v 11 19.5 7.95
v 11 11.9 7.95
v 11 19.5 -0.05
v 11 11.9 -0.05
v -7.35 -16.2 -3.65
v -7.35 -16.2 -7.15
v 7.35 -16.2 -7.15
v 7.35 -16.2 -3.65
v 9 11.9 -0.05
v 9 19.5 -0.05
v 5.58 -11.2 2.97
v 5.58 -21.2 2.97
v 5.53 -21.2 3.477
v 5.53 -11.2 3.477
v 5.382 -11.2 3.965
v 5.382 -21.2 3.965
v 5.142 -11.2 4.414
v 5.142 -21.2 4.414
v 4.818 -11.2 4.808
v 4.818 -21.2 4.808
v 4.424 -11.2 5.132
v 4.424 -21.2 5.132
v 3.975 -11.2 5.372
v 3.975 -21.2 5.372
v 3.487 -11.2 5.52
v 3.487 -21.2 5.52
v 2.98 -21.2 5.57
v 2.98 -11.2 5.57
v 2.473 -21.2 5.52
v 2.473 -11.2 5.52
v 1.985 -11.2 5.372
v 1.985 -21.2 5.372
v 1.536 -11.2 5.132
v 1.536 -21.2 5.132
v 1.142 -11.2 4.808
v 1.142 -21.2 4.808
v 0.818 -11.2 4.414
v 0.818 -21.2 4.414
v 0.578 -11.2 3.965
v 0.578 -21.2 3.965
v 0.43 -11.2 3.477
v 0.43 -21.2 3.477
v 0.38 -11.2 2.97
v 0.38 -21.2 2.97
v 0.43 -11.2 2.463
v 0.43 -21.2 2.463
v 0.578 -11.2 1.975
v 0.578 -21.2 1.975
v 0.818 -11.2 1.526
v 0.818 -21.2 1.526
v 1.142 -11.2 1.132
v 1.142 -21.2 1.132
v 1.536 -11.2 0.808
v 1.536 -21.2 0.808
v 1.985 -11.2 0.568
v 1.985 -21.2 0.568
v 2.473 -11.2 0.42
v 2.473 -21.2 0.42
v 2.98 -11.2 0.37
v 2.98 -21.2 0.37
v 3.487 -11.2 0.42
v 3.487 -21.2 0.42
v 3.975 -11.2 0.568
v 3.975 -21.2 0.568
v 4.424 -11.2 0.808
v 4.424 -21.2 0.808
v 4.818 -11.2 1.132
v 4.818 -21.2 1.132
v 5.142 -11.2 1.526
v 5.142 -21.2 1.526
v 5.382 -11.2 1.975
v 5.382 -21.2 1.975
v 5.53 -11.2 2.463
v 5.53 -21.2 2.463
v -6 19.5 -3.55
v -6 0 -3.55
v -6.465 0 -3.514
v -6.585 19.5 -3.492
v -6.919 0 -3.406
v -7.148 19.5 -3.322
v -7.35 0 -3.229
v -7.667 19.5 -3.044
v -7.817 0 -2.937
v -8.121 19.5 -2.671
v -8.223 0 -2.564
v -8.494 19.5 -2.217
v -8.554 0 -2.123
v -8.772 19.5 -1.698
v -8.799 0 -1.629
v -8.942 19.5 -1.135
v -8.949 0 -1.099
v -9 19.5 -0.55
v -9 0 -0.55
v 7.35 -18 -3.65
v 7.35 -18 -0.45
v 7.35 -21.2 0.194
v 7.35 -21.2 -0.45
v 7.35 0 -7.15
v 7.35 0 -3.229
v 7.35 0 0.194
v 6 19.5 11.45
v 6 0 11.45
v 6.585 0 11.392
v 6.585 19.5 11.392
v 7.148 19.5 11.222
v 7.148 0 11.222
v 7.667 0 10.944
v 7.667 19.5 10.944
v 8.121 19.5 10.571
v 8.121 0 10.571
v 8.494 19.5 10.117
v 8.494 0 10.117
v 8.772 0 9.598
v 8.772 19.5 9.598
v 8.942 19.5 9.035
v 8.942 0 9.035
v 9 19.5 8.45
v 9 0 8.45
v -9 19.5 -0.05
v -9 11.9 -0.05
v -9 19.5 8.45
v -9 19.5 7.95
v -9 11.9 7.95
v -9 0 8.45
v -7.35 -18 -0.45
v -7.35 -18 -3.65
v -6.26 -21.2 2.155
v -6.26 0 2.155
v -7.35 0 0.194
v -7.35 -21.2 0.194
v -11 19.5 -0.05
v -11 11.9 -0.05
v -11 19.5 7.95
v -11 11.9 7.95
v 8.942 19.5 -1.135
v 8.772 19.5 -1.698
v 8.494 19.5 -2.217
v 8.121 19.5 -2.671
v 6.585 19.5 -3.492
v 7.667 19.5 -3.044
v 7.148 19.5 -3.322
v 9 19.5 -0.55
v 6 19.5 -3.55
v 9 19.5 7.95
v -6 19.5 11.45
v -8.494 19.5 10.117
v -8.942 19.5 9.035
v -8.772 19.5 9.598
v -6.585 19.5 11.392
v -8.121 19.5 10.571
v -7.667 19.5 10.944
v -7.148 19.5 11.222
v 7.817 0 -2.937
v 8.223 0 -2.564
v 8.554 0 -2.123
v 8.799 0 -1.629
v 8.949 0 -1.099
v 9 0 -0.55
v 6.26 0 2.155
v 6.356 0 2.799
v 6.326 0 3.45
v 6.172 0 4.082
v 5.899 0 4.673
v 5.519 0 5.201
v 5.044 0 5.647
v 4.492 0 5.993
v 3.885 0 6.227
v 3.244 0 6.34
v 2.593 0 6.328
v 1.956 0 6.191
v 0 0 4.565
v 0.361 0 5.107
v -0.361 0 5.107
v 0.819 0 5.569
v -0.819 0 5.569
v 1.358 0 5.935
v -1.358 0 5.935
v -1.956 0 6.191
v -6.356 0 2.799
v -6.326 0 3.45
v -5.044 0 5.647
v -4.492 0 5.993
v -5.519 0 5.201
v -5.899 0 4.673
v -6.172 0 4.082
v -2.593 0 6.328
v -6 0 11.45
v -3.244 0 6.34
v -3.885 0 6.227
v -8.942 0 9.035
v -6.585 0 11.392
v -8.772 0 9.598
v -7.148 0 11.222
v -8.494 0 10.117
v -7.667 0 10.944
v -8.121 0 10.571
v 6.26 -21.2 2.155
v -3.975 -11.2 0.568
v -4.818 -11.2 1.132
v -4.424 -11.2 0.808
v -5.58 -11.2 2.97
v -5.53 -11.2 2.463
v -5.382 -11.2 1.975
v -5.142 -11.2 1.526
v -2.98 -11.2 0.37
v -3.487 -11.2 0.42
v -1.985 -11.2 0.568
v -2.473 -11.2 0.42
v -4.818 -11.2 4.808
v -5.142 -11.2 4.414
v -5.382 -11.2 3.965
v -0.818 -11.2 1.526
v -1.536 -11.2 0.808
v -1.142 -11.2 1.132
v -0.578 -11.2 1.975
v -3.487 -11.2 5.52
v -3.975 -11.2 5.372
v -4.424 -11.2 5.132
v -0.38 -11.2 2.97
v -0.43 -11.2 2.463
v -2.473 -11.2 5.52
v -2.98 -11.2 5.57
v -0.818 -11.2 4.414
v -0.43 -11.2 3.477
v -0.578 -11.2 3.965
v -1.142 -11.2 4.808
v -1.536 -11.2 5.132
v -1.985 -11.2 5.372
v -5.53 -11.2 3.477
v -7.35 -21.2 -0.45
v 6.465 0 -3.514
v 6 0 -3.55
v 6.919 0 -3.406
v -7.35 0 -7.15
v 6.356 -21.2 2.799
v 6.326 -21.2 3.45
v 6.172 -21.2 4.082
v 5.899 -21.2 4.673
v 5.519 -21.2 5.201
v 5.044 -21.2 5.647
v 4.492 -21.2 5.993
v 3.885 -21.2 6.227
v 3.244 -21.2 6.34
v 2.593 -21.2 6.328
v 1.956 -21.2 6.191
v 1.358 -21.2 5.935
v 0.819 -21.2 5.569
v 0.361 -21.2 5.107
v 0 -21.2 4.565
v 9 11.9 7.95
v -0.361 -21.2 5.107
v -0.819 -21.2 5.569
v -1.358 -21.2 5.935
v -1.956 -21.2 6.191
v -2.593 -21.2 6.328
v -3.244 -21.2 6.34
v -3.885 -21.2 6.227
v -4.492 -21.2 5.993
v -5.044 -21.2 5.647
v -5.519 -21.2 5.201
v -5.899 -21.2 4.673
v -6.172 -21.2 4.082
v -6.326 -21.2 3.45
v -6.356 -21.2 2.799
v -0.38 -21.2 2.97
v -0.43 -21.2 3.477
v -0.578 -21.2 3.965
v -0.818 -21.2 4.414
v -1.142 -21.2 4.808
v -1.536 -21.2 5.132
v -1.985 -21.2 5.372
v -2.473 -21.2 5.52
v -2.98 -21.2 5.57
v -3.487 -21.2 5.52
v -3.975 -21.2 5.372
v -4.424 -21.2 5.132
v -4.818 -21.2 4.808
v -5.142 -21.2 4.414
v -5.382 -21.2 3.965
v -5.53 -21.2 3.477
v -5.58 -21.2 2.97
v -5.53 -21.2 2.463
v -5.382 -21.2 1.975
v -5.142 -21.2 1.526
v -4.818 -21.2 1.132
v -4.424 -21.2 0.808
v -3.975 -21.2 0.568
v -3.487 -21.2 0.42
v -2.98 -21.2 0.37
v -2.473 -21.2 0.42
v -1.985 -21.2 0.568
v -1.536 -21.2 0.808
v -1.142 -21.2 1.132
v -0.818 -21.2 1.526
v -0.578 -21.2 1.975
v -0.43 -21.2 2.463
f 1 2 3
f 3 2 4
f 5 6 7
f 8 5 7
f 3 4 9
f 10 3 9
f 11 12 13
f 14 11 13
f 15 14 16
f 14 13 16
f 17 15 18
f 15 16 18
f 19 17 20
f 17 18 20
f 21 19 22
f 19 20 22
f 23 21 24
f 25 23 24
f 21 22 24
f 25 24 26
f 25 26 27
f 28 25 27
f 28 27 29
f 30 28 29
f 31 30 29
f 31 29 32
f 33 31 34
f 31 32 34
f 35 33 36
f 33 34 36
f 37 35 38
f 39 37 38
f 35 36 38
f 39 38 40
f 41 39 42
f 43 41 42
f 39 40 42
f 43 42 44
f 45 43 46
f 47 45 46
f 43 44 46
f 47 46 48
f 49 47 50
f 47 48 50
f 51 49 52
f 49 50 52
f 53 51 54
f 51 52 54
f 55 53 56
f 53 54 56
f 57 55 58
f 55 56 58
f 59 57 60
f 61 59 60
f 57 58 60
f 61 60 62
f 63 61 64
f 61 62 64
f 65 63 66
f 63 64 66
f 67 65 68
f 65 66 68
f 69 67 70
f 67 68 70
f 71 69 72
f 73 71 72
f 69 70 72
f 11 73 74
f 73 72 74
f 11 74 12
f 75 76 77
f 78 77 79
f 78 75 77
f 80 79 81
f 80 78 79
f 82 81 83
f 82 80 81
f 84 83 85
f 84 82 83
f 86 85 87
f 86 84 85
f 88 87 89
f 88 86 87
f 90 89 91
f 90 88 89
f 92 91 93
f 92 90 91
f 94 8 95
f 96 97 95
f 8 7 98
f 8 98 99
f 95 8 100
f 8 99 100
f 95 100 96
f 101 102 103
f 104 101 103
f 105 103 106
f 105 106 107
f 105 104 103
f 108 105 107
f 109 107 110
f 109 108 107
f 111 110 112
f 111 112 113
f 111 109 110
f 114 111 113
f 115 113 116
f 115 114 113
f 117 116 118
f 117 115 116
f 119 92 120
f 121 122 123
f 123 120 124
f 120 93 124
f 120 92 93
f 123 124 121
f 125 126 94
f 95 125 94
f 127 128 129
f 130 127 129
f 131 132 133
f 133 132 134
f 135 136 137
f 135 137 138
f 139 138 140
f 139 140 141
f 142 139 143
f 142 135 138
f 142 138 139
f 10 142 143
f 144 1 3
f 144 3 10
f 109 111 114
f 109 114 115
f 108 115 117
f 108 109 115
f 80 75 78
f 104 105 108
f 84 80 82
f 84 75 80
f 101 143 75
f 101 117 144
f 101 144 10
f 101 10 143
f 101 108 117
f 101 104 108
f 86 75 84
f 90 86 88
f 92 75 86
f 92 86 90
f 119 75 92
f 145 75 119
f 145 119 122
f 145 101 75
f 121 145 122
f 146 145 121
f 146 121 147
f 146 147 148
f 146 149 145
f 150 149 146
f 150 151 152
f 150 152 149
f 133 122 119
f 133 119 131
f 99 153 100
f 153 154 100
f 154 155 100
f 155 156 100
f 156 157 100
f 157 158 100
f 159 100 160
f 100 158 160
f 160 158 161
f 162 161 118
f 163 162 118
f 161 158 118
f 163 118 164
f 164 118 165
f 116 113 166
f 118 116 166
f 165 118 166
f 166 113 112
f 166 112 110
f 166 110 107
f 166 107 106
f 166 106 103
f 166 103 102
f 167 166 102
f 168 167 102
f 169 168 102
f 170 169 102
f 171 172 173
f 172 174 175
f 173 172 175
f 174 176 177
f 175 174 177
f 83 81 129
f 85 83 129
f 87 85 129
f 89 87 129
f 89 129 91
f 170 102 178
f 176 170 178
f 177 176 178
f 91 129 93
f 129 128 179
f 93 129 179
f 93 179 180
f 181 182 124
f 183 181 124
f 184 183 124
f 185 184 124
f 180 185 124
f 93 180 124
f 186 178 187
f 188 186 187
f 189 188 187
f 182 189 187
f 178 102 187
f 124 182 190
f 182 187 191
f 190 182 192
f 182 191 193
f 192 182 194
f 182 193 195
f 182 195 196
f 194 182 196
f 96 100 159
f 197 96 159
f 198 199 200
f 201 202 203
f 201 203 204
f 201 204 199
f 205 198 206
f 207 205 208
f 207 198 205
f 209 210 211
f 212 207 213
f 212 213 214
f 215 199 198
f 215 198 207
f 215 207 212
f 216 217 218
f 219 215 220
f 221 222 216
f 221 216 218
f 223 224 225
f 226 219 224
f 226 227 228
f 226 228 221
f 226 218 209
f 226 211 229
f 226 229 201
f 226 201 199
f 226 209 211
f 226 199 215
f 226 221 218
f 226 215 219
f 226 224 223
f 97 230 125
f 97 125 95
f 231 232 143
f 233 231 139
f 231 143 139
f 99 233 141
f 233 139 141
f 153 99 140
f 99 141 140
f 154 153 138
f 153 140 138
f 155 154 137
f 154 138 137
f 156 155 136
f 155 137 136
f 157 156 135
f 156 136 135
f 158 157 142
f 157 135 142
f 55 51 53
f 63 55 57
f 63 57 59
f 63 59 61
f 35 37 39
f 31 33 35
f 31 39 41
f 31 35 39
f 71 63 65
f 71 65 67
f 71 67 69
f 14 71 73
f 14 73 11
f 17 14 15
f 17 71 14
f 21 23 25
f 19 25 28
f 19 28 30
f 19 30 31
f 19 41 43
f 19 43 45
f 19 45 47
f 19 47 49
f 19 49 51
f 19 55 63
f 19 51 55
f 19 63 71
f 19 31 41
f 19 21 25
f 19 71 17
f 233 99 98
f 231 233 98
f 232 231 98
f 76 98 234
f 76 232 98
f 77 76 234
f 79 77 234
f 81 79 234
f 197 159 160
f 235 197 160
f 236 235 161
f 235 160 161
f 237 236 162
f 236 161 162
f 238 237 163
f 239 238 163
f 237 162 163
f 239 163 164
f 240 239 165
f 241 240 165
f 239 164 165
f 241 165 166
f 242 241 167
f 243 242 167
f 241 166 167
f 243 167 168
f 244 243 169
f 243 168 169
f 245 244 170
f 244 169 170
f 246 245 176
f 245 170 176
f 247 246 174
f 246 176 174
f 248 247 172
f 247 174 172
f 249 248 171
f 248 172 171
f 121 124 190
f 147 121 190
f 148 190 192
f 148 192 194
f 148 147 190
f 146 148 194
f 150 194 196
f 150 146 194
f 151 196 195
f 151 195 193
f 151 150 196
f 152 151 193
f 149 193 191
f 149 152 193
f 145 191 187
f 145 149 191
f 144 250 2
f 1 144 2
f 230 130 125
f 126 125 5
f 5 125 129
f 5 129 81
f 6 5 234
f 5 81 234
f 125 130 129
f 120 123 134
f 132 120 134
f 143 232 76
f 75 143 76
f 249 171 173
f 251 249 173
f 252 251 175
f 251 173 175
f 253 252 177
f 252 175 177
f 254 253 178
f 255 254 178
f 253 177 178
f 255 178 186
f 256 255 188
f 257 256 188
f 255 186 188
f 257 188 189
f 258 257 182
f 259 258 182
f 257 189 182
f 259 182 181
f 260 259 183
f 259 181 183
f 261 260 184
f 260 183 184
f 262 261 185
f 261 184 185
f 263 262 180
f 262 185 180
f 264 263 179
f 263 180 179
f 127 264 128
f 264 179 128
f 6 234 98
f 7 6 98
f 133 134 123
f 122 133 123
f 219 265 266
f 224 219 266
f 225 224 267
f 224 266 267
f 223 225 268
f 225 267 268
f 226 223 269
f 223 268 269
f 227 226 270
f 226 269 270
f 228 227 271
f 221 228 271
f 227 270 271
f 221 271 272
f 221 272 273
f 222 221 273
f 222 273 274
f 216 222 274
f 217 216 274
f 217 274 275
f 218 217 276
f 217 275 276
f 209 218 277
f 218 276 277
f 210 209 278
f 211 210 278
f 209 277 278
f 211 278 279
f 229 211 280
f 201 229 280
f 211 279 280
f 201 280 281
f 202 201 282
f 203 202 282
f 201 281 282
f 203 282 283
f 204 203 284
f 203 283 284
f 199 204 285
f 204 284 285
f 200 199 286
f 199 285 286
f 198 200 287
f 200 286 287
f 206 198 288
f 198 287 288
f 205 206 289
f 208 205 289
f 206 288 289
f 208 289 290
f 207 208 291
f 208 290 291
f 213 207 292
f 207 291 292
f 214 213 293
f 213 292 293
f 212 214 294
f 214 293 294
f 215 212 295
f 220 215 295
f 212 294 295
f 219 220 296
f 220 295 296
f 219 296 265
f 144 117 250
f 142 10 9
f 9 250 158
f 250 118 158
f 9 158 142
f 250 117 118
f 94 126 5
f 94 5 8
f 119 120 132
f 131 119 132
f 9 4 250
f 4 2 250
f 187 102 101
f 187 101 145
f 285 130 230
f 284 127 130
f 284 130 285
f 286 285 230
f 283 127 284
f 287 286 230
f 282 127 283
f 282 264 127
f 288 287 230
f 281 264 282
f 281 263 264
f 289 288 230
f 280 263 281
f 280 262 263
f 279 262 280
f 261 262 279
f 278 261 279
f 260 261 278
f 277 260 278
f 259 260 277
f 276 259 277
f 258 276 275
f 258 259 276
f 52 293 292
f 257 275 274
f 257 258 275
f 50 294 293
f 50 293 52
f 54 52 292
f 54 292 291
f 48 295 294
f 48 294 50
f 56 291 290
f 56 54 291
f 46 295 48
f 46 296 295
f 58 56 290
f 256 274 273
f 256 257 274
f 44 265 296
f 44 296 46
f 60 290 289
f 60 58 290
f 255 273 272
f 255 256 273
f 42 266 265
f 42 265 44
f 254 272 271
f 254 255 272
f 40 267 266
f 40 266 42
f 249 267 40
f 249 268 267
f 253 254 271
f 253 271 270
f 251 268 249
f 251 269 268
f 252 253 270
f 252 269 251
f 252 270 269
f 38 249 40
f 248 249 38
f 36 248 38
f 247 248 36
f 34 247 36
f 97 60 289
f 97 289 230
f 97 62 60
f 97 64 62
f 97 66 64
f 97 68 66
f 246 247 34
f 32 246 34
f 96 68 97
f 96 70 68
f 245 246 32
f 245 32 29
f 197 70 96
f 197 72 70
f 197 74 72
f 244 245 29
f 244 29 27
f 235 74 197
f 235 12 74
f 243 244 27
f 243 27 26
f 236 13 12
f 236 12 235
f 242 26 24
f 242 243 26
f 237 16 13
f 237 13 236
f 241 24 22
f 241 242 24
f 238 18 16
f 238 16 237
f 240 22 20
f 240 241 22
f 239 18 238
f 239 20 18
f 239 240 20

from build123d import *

# Parameters (mm, degrees)
F1_DEPTH     = 21.2
F2_W         = 14.7
F2_H         = 3.2
F3_DEPTH     = 6.7
F4_R         = 2.6
F5_DEPTH     = 10
F6_W         = 18
F6_H         = 15
F7_DEPTH     = 11.9
F9_DEPTH     = 7.6
F10_T1_DEPTH = 34.5
F10_T3_DEPTH = 27
F11_W        = 14.7
F11_H        = 1.8
F12_DEPTH    = 3.5


# Not quite as in the source:
# - a fillet or chamfer that OpenCascade refuses, or shapes differently, is made with other operations: its cross-section is extruded or revolved along the edge and cut away or added


with BuildPart() as f1:
    # F0 (on Front) → F1 (new body)
    with BuildSketch(Plane.XZ):
        with BuildLine():
            Line((-7.35, 0.194197055), (-7.35, -7.15))
            Line((-7.35, -7.15), (7.35, -7.15))
            Line((7.35, -7.15), (7.35, 0.194197055))
            Line((7.35, 0.194197055), (6.2603328375, 2.1552506672))
            ThreePointArc((6.2603328375, 2.1552506672), (3.3980247264, -0.3840505852), (0, 1.375007837))
            ThreePointArc((0, 1.375007837), (-3.3980247264, -0.3840505852), (-6.2603328375, 2.1552506672))
            Line((-6.2603328375, 2.1552506672), (-7.35, 0.194197055))
        make_face()
        with BuildLine():
            ThreePointArc((0, 4.564992163), (-4.1941925187, 6.1243837001), (-6.2603328375, 2.1552506672))
            ThreePointArc((-6.2603328375, 2.1552506672), (-3.3980247264, -0.3840505852), (0, 1.375007837))
            ThreePointArc((0, 1.375007837), (3.3980247264, -0.3840505852), (6.2603328375, 2.1552506672))
            ThreePointArc((6.2603328375, 2.1552506672), (4.1941925187, 6.1243837001), (0, 4.564992163))
        make_face()
    extrude(amount=F1_DEPTH)

    # F2 (on face) → F3 (cut)
    with BuildSketch(Plane(origin=(0, 0, -7.15), x_dir=(1, 0, 0), z_dir=(0, 0, -1))):
        with Locations((0, 19.6)):
            Rectangle(F2_W, F2_H)
    extrude(amount=-F3_DEPTH, mode=Mode.SUBTRACT)

    # F4 (on face) → F5 (cut)
    with BuildSketch(Plane.XZ.offset(21.2)):
        with Locations((-2.98, 2.97)):
            Circle(F4_R)
        with Locations((2.98, 2.97)):
            Circle(F4_R)
    extrude(amount=-F5_DEPTH, mode=Mode.SUBTRACT)

    # F6 (on face) → F7 (join)
    with BuildSketch(Plane(origin=(0, 0, 0), x_dir=(-1, 0, 0), z_dir=(0, 1, 0))):
        with Locations((0, 3.95)):
            Rectangle(F6_W, F6_H)
    extrude(amount=F7_DEPTH)

    # F8 (on face) → F9 (join)
    with BuildSketch(Plane(origin=(0, 11.9, 0), x_dir=(-1, 0, 0), z_dir=(0, 1, 0))):
        Polygon((-9, -0.05), (-9, -3.55), (9, -3.55), (9, -0.05), (11, -0.05), (11, 7.95), (9, 7.95), (9, 11.45), (-9, 11.45), (-9, 7.95), (-11, 7.95), (-11, -0.05), align=None)
    extrude(amount=F9_DEPTH)

    # F10: fillet of radius 3 on 4 edges, made by hand

    # F10_s2 → F10_t1 (cut)
    with BuildSketch(Plane.XZ.offset(-27)):
        with BuildLine():
            ThreePointArc((6, 11.45), (8.1213203436, 10.5713203436), (9, 8.45))
            Line((9, 8.45), (9, 11.45))
            Line((9, 11.45), (6, 11.45))
        make_face()
        with BuildLine():
            ThreePointArc((-9, 8.45), (-8.1213203436, 10.5713203436), (-6, 11.45))
            Line((-6, 11.45), (-9, 11.45))
            Line((-9, 11.45), (-9, 8.45))
        make_face()
    extrude(amount=F10_T1_DEPTH, mode=Mode.SUBTRACT)

    # F10_s4 → F10_t3 (cut)
    with BuildSketch(Plane.XZ.offset(-27)):
        with BuildLine():
            ThreePointArc((6, -3.55), (8.1213203436, -2.6713203436), (9, -0.55))
            Line((9, -0.55), (9, -3.55))
            Line((9, -3.55), (6, -3.55))
        make_face()
        with BuildLine():
            ThreePointArc((-6, -3.55), (-8.1213203436, -2.6713203436), (-9, -0.55))
            Line((-9, -0.55), (-9, -3.55))
            Line((-9, -3.55), (-6, -3.55))
        make_face()
    extrude(amount=F10_T3_DEPTH, mode=Mode.SUBTRACT)

    # F11 (on face) → F12 (cut)
    with BuildSketch(Plane(origin=(0, 0, -7.15), x_dir=(1, 0, 0), z_dir=(0, 0, -1))):
        with Locations((0, 17.1)):
            Rectangle(F11_W, F11_H)
    extrude(amount=-F12_DEPTH, mode=Mode.SUBTRACT)


solid = f1.part
